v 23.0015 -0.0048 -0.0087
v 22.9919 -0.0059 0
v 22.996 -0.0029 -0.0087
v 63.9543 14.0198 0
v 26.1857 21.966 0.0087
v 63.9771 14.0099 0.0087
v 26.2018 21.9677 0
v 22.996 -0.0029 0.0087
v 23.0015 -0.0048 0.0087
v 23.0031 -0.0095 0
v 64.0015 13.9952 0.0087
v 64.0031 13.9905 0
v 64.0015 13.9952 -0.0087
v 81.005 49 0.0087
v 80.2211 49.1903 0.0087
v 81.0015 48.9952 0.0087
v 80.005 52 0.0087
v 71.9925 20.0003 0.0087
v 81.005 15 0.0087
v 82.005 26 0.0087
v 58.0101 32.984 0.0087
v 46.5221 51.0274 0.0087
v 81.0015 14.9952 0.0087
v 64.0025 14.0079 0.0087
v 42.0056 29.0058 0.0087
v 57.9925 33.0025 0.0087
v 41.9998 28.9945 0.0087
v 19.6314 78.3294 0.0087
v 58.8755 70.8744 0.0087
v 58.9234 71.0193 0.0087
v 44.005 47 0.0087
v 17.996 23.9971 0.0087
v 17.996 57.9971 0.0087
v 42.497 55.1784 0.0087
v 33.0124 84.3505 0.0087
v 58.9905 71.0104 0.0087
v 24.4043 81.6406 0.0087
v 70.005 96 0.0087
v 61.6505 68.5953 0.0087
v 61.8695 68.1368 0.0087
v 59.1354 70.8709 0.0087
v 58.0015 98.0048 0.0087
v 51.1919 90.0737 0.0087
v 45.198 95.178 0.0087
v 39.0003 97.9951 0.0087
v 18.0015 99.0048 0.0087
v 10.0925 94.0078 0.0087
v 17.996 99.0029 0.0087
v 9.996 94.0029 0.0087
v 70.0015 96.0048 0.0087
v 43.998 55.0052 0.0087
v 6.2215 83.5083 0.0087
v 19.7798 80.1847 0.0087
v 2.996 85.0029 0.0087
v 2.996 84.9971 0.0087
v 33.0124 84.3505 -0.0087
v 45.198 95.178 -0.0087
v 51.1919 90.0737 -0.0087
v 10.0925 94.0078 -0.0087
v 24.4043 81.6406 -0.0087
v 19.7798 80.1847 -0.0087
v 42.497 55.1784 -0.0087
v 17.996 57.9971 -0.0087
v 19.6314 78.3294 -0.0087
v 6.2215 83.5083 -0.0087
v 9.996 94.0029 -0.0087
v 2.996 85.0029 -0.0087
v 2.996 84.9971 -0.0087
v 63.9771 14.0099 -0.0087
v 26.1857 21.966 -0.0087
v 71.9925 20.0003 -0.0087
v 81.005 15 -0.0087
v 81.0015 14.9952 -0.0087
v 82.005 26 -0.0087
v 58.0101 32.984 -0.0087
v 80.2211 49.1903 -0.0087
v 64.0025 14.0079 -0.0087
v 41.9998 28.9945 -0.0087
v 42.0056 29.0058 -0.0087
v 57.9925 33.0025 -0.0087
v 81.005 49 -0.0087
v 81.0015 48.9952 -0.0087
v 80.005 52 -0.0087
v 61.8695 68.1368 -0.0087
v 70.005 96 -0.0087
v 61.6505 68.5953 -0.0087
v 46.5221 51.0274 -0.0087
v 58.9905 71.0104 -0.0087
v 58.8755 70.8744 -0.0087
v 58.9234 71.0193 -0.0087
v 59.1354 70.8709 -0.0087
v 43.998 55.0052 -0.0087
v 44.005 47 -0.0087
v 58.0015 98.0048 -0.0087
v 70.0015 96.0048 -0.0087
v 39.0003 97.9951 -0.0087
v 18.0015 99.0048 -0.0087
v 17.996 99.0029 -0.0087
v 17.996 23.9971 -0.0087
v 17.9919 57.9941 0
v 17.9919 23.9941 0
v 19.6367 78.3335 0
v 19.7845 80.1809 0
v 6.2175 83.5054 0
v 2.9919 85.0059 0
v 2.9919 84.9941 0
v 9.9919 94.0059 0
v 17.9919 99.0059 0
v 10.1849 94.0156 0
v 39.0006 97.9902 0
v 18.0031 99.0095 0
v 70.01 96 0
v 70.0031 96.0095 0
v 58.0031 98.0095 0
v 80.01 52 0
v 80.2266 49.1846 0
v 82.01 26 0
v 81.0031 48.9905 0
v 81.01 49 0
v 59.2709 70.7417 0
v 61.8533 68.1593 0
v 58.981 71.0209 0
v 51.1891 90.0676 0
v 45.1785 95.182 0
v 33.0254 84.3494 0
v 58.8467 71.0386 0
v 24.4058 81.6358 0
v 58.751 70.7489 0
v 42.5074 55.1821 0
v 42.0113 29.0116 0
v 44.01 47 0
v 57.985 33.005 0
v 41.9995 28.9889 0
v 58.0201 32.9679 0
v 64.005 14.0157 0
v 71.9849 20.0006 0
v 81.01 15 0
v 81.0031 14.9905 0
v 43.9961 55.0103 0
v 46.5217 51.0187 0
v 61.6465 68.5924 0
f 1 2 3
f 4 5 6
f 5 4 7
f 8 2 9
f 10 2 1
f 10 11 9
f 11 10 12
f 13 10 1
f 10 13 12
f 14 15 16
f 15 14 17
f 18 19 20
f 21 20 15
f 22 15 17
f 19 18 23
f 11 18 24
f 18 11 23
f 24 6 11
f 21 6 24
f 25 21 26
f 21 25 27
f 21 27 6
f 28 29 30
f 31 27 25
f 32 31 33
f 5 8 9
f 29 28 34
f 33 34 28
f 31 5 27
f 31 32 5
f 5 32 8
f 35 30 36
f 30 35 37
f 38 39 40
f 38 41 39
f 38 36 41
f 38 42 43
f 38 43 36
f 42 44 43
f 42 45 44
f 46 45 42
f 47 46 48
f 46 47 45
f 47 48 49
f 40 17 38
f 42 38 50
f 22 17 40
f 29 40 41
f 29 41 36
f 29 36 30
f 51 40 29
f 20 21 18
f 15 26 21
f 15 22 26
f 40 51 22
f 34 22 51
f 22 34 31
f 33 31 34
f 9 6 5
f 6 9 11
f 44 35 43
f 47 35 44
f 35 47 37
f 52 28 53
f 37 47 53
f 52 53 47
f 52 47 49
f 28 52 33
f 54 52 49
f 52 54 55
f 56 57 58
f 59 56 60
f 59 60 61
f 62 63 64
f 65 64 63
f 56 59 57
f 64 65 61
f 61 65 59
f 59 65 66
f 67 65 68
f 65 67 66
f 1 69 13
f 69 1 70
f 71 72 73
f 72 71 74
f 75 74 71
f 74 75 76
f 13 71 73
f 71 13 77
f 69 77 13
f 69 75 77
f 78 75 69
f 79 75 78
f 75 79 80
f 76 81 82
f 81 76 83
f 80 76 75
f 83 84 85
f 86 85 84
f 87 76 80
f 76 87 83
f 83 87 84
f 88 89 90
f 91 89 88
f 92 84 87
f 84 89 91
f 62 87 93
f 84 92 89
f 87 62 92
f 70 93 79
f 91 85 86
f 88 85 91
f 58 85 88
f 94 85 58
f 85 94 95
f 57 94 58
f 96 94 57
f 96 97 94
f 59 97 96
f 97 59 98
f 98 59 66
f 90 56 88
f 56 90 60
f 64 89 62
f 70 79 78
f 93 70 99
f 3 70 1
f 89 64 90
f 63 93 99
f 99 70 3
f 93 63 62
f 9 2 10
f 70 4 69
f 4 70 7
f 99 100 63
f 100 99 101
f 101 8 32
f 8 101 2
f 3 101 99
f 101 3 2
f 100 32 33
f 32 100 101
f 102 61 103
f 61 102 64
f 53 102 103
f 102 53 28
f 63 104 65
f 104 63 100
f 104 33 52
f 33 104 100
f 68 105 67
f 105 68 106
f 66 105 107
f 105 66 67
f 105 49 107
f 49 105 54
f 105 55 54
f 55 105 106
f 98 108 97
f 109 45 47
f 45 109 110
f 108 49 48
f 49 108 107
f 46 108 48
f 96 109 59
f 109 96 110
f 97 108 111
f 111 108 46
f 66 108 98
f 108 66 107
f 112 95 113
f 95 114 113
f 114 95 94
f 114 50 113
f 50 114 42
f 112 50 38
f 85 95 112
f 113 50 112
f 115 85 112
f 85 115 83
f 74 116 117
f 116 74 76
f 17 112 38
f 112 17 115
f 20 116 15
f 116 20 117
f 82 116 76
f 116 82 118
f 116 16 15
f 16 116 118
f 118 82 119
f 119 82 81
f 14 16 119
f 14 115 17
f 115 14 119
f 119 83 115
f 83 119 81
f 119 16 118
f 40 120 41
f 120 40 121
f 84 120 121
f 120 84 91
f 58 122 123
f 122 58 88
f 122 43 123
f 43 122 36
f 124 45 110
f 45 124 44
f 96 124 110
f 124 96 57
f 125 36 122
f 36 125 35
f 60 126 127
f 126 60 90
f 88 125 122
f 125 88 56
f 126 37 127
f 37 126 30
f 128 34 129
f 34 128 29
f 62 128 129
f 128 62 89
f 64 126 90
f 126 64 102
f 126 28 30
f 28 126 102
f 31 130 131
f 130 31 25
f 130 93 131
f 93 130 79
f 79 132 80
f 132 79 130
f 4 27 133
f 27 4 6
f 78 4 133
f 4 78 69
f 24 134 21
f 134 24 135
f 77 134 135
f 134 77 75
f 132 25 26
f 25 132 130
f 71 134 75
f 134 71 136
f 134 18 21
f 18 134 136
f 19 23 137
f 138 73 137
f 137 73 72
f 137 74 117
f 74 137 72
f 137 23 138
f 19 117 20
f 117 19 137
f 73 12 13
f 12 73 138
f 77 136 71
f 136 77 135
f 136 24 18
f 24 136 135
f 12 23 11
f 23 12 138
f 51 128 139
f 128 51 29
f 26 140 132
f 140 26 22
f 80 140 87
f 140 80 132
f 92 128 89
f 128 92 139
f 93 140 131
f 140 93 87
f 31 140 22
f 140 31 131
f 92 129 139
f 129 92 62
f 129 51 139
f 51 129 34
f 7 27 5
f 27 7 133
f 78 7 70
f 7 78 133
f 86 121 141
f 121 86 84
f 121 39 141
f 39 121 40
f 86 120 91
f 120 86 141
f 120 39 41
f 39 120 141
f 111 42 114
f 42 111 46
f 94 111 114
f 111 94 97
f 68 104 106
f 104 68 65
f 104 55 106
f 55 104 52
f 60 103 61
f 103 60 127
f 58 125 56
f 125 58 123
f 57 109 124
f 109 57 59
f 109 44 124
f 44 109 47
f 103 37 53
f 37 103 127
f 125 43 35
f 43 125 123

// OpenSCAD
color([0.3519350680925015,0.6477014615427978,0.14125726454845833]) hull(){
    translate([23,0]) sphere(0.01);
    translate([64,14]) sphere(0.01);
    translate([26,22]) sphere(0.01);
}
color([0.23013900541024712,0.8285218163248013,0.9603761550286747]) hull(){
    translate([26,22]) sphere(0.01);
    translate([24,21]) sphere(0.01);
    translate([23,0]) sphere(0.01);
}
color([0.6050710034948523,0.017553655236826726,0.43262871278032167]) hull(){
    translate([24,21]) sphere(0.01);
    translate([18,24]) sphere(0.01);
    translate([23,0]) sphere(0.01);
}
color([0.2571490251669072,0.4480229944680496,0.14517873337393172]) hull(){
    translate([18,24]) sphere(0.01);
    translate([18,58]) sphere(0.01);
    translate([23,0]) sphere(0.01);
}
color([0.8405131005933094,0.9776834869331054,0.10300019528175153]) hull(){
    translate([18,58]) sphere(0.01);
    translate([16,79]) sphere(0.01);
    translate([20,83]) sphere(0.01);
}
color([0.998153073210626,0.8535026464000083,0.6855970549077809]) hull(){
    translate([18,58]) sphere(0.01);
    translate([20,83]) sphere(0.01);
    translate([6,84]) sphere(0.01);
}
color([0.7995005100691247,0.34047238184459006,0.1286635278612125]) hull(){
    translate([6,84]) sphere(0.01);
    translate([3,85]) sphere(0.01);
    translate([10,94]) sphere(0.01);
}
color([0.6020598448119898,0.9167847797194366,0.02081986636819022]) hull(){
    translate([10,94]) sphere(0.01);
    translate([18,99]) sphere(0.01);
    translate([39,98]) sphere(0.01);
}
color([0.9135118305629362,0.3823609034395232,0.42581309278619206]) hull(){
    translate([39,98]) sphere(0.01);
    translate([58,98]) sphere(0.01);
    translate([70,96]) sphere(0.01);
}
color([0.08967296065919184,0.0016857337534631478,0.31287848776698257]) hull(){
    translate([70,96]) sphere(0.01);
    translate([82,26]) sphere(0.01);
    translate([80,52]) sphere(0.01);
}
color([0.09731792302828757,0.364404074066101,0.8754307508322564]) hull(){
    translate([80,52]) sphere(0.01);
    translate([77,50]) sphere(0.01);
    translate([81,49]) sphere(0.01);
}
color([0.6967090939923642,0.5776053806129825,0.18685318159950626]) hull(){
    translate([81,49]) sphere(0.01);
    translate([77,50]) sphere(0.01);
    translate([59,71]) sphere(0.01);
}
color([0.9585806736472646,0.593334846568766,0.09927504601217696]) hull(){
    translate([59,71]) sphere(0.01);
    translate([50,93]) sphere(0.01);
    translate([58,98]) sphere(0.01);
}
color([0.19313665173925,0.6863688301261038,0.2093263356404984]) hull(){
    translate([50,93]) sphere(0.01);
    translate([39,98]) sphere(0.01);
    translate([58,98]) sphere(0.01);
}
color([0.2694340379225941,0.24598969558588324,0.16092298384524362]) hull(){
    translate([59,71]) sphere(0.01);
    translate([22,90]) sphere(0.01);
    translate([20,83]) sphere(0.01);
}
color([0.5102606956149307,0.431705445139412,0.38909399282504675]) hull(){
    translate([22,90]) sphere(0.01);
    translate([10,94]) sphere(0.01);
    translate([20,83]) sphere(0.01);
}
color([0.3194819673674283,0.6655357355223767,0.22692357675811492]) hull(){
    translate([20,83]) sphere(0.01);
    translate([10,94]) sphere(0.01);
    translate([6,84]) sphere(0.01);
}
color([0.9464906820257937,0.35776616524050997,0.9421064453260054]) hull(){
    translate([16,79]) sphere(0.01);
    translate([20,83]) sphere(0.01);
    translate([22,90]) sphere(0.01);
}
color([0.3792404853118415,0.27508202782836655,0.9368074710650367]) hull(){
    translate([16,79]) sphere(0.01);
    translate([22,90]) sphere(0.01);
    translate([6,84]) sphere(0.01);
}
color([0.7670397757471089,0.17483880300164423,0.7474114244696689]) hull(){
    translate([18,58]) sphere(0.01);
    translate([26,51]) sphere(0.01);
    translate([30,57]) sphere(0.01);
}
color([0.6015236368594579,0.5872808850844162,0.28390336255679416]) hull(){
    translate([18,58]) sphere(0.01);
    translate([30,57]) sphere(0.01);
    translate([16,79]) sphere(0.01);
}
color([0.5839405385485582,0.4048698908705002,0.6877557316706271]) hull(){
    translate([30,57]) sphere(0.01);
    translate([59,71]) sphere(0.01);
    translate([35,48]) sphere(0.01);
}
color([0.29310936231965135,0.08456113000314536,0.6409271470126323]) hull(){
    translate([30,57]) sphere(0.01);
    translate([16,79]) sphere(0.01);
    translate([59,71]) sphere(0.01);
}
color([0.38512246522478266,0.6162859510128613,0.407224705538046]) hull(){
    translate([26,51]) sphere(0.01);
    translate([44,47]) sphere(0.01);
    translate([30,57]) sphere(0.01);
}
color([0.6107800780239486,0.9541913078580654,0.09369719926319908]) hull(){
    translate([44,47]) sphere(0.01);
    translate([44,55]) sphere(0.01);
    translate([42,29]) sphere(0.01);
}
color([0.4396226851829427,0.9817497074141792,0.30111933510979894]) hull(){
    translate([42,29]) sphere(0.01);
    translate([58,33]) sphere(0.01);
    translate([64,14]) sphere(0.01);
}
color([0.08571041628526821,0.691130580335744,0.16573157374072334]) hull(){
    translate([58,33]) sphere(0.01);
    translate([82,26]) sphere(0.01);
    translate([72,20]) sphere(0.01);
}
color([0.4668304924867862,0.30100213617539295,0.3511677492745029]) hull(){
    translate([72,20]) sphere(0.01);
    translate([81,15]) sphere(0.01);
    translate([82,26]) sphere(0.01);
}
color([0.05564944269037686,0.7696481469448815,0.686275624239137]) hull(){
    translate([64,14]) sphere(0.01);
    translate([72,20]) sphere(0.01);
    translate([81,15]) sphere(0.01);
}
color([0.15447252119296884,0.35335085758162643,0.18799175914388588]) hull(){
    translate([64,14]) sphere(0.01);
    translate([81,15]) sphere(0.01);
    translate([68,15]) sphere(0.01);
}
color([0.41322879780265653,0.82270842281296,0.9057146612667819]) hull(){
    translate([68,15]) sphere(0.01);
    translate([82,26]) sphere(0.01);
    translate([81,15]) sphere(0.01);
}
color([0.9688547633127277,0.5528378273263655,0.12760284187612392]) hull(){
    translate([72,20]) sphere(0.01);
    translate([82,26]) sphere(0.01);
    translate([80,52]) sphere(0.01);
}
color([0.1710979555253146,0.7131998843266452,0.6397779425125977]) hull(){
    translate([58,33]) sphere(0.01);
    translate([72,20]) sphere(0.01);
    translate([80,52]) sphere(0.01);
}
color([0.57496968906483,0.8489371230716904,0.07944838941339594]) hull(){
    translate([58,33]) sphere(0.01);
    translate([80,52]) sphere(0.01);
    translate([77,50]) sphere(0.01);
}
color([0.040333123224873146,0.9305910632054132,0.3080440975445232]) hull(){
    translate([58,33]) sphere(0.01);
    translate([77,50]) sphere(0.01);
    translate([59,71]) sphere(0.01);
}
color([0.6084655882345898,0.4923441190446234,0.7069385087242315]) hull(){
    translate([58,33]) sphere(0.01);
    translate([59,71]) sphere(0.01);
    translate([44,55]) sphere(0.01);
}
color([0.6803385961846494,0.18024793645131376,0.10787678186317007]) hull(){
    translate([44,55]) sphere(0.01);
    translate([59,71]) sphere(0.01);
    translate([44,47]) sphere(0.01);
}
color([0.1335624130282893,0.47731112778056706,0.8393950916733898]) hull(){
    translate([44,47]) sphere(0.01);
    translate([35,48]) sphere(0.01);
    translate([30,57]) sphere(0.01);
}
color([0.6780893207968227,0.08337096158279222,0.27725115680544954]) hull(){
    translate([35,48]) sphere(0.01);
    translate([26,51]) sphere(0.01);
    translate([30,57]) sphere(0.01);
}
color([0.9965791662073833,0.03375154870506614,0.10494976972159242]) hull(){
    translate([35,48]) sphere(0.01);
    translate([18,58]) sphere(0.01);
    translate([26,51]) sphere(0.01);
}
color([0.516844917539197,0.1360610465034362,0.543805910213663]) hull(){
    translate([35,48]) sphere(0.01);
    translate([44,55]) sphere(0.01);
    translate([18,58]) sphere(0.01);
}
color([0.04901628196141694,0.4867102513994055,0.8813892002857401]) hull(){
    translate([44,55]) sphere(0.01);
    translate([42,29]) sphere(0.01);
    translate([18,58]) sphere(0.01);
}
color([0.3053751014353143,0.40772022041766365,0.31297204198076634]) hull(){
    translate([42,29]) sphere(0.01);
    translate([26,22]) sphere(0.01);
    translate([24,21]) sphere(0.01);
}
color([0.49907796034366436,0.6160709555012981,0.9916538905911245]) hull(){
    translate([42,29]) sphere(0.01);
    translate([24,21]) sphere(0.01);
    translate([18,24]) sphere(0.01);
}
color([0.3123575451593331,0.46364206475662195,0.8862899719975306]) hull(){
    translate([42,29]) sphere(0.01);
    translate([18,24]) sphere(0.01);
    translate([18,58]) sphere(0.01);
}
color([0.5738800220993816,0.8494037217359881,0.24323676398212035]) hull(){
    translate([6,84]) sphere(0.01);
    translate([22,90]) sphere(0.01);
    translate([10,94]) sphere(0.01);
}
color([0.8402878098664139,0.9530478541805099,0.16594803365564914]) hull(){
    translate([10,94]) sphere(0.01);
    translate([39,98]) sphere(0.01);
    translate([18,99]) sphere(0.01);
}
color([0.0023370868964924796,0.7387895340607371,0.5374530602666081]) hull(){
    translate([39,98]) sphere(0.01);
    translate([70,96]) sphere(0.01);
    translate([58,98]) sphere(0.01);
}
color([0.25604025835089217,0.4320068924153808,0.5112453323210508]) hull(){
    translate([70,96]) sphere(0.01);
    translate([50,93]) sphere(0.01);
    translate([82,26]) sphere(0.01);
}
color([0.7462272619347637,0.5039790716190428,0.8850839351693509]) hull(){
    translate([50,93]) sphere(0.01);
    translate([59,71]) sphere(0.01);
    translate([80,52]) sphere(0.01);
}
color([0.6652757233710683,0.22263754843686523,0.08942086350367451]) hull(){
    translate([50,93]) sphere(0.01);
    translate([80,52]) sphere(0.01);
    translate([82,26]) sphere(0.01);
}
color([0.6195232841458308,0.9036720387350747,0.7222923954673625]) hull(){
    translate([18,99]) sphere(0.01);
    translate([58,98]) sphere(0.01);
    translate([39,98]) sphere(0.01);
}
color([0.6665075097113882,0.5421139713900744,0.6943978877819516]) hull(){
    translate([3,85]) sphere(0.01);
    translate([6,84]) sphere(0.01);
    translate([20,83]) sphere(0.01);
}
color([0.9269770591996176,0.12480324665016229,0.8422397758241813]) hull(){
    translate([3,85]) sphere(0.01);
    translate([20,83]) sphere(0.01);
    translate([16,79]) sphere(0.01);
}
color([0.028249143050612435,0.8554899328562455,0.6212809598996976]) hull(){
    translate([3,85]) sphere(0.01);
    translate([16,79]) sphere(0.01);
    translate([10,94]) sphere(0.01);
}
color([0.6435486749275994,0.4857227915978113,0.2898251547629681]) hull(){
    translate([10,94]) sphere(0.01);
    translate([16,79]) sphere(0.01);
    translate([70,96]) sphere(0.01);
}
color([0.21709076393122206,0.4979948584580751,0.6176241526046676]) hull(){
    translate([16,79]) sphere(0.01);
    translate([70,96]) sphere(0.01);
    translate([22,90]) sphere(0.01);
}
color([0.4722249532281336,0.7228331534363125,0.6109414561657331]) hull(){
    translate([70,96]) sphere(0.01);
    translate([22,90]) sphere(0.01);
    translate([58,98]) sphere(0.01);
}
